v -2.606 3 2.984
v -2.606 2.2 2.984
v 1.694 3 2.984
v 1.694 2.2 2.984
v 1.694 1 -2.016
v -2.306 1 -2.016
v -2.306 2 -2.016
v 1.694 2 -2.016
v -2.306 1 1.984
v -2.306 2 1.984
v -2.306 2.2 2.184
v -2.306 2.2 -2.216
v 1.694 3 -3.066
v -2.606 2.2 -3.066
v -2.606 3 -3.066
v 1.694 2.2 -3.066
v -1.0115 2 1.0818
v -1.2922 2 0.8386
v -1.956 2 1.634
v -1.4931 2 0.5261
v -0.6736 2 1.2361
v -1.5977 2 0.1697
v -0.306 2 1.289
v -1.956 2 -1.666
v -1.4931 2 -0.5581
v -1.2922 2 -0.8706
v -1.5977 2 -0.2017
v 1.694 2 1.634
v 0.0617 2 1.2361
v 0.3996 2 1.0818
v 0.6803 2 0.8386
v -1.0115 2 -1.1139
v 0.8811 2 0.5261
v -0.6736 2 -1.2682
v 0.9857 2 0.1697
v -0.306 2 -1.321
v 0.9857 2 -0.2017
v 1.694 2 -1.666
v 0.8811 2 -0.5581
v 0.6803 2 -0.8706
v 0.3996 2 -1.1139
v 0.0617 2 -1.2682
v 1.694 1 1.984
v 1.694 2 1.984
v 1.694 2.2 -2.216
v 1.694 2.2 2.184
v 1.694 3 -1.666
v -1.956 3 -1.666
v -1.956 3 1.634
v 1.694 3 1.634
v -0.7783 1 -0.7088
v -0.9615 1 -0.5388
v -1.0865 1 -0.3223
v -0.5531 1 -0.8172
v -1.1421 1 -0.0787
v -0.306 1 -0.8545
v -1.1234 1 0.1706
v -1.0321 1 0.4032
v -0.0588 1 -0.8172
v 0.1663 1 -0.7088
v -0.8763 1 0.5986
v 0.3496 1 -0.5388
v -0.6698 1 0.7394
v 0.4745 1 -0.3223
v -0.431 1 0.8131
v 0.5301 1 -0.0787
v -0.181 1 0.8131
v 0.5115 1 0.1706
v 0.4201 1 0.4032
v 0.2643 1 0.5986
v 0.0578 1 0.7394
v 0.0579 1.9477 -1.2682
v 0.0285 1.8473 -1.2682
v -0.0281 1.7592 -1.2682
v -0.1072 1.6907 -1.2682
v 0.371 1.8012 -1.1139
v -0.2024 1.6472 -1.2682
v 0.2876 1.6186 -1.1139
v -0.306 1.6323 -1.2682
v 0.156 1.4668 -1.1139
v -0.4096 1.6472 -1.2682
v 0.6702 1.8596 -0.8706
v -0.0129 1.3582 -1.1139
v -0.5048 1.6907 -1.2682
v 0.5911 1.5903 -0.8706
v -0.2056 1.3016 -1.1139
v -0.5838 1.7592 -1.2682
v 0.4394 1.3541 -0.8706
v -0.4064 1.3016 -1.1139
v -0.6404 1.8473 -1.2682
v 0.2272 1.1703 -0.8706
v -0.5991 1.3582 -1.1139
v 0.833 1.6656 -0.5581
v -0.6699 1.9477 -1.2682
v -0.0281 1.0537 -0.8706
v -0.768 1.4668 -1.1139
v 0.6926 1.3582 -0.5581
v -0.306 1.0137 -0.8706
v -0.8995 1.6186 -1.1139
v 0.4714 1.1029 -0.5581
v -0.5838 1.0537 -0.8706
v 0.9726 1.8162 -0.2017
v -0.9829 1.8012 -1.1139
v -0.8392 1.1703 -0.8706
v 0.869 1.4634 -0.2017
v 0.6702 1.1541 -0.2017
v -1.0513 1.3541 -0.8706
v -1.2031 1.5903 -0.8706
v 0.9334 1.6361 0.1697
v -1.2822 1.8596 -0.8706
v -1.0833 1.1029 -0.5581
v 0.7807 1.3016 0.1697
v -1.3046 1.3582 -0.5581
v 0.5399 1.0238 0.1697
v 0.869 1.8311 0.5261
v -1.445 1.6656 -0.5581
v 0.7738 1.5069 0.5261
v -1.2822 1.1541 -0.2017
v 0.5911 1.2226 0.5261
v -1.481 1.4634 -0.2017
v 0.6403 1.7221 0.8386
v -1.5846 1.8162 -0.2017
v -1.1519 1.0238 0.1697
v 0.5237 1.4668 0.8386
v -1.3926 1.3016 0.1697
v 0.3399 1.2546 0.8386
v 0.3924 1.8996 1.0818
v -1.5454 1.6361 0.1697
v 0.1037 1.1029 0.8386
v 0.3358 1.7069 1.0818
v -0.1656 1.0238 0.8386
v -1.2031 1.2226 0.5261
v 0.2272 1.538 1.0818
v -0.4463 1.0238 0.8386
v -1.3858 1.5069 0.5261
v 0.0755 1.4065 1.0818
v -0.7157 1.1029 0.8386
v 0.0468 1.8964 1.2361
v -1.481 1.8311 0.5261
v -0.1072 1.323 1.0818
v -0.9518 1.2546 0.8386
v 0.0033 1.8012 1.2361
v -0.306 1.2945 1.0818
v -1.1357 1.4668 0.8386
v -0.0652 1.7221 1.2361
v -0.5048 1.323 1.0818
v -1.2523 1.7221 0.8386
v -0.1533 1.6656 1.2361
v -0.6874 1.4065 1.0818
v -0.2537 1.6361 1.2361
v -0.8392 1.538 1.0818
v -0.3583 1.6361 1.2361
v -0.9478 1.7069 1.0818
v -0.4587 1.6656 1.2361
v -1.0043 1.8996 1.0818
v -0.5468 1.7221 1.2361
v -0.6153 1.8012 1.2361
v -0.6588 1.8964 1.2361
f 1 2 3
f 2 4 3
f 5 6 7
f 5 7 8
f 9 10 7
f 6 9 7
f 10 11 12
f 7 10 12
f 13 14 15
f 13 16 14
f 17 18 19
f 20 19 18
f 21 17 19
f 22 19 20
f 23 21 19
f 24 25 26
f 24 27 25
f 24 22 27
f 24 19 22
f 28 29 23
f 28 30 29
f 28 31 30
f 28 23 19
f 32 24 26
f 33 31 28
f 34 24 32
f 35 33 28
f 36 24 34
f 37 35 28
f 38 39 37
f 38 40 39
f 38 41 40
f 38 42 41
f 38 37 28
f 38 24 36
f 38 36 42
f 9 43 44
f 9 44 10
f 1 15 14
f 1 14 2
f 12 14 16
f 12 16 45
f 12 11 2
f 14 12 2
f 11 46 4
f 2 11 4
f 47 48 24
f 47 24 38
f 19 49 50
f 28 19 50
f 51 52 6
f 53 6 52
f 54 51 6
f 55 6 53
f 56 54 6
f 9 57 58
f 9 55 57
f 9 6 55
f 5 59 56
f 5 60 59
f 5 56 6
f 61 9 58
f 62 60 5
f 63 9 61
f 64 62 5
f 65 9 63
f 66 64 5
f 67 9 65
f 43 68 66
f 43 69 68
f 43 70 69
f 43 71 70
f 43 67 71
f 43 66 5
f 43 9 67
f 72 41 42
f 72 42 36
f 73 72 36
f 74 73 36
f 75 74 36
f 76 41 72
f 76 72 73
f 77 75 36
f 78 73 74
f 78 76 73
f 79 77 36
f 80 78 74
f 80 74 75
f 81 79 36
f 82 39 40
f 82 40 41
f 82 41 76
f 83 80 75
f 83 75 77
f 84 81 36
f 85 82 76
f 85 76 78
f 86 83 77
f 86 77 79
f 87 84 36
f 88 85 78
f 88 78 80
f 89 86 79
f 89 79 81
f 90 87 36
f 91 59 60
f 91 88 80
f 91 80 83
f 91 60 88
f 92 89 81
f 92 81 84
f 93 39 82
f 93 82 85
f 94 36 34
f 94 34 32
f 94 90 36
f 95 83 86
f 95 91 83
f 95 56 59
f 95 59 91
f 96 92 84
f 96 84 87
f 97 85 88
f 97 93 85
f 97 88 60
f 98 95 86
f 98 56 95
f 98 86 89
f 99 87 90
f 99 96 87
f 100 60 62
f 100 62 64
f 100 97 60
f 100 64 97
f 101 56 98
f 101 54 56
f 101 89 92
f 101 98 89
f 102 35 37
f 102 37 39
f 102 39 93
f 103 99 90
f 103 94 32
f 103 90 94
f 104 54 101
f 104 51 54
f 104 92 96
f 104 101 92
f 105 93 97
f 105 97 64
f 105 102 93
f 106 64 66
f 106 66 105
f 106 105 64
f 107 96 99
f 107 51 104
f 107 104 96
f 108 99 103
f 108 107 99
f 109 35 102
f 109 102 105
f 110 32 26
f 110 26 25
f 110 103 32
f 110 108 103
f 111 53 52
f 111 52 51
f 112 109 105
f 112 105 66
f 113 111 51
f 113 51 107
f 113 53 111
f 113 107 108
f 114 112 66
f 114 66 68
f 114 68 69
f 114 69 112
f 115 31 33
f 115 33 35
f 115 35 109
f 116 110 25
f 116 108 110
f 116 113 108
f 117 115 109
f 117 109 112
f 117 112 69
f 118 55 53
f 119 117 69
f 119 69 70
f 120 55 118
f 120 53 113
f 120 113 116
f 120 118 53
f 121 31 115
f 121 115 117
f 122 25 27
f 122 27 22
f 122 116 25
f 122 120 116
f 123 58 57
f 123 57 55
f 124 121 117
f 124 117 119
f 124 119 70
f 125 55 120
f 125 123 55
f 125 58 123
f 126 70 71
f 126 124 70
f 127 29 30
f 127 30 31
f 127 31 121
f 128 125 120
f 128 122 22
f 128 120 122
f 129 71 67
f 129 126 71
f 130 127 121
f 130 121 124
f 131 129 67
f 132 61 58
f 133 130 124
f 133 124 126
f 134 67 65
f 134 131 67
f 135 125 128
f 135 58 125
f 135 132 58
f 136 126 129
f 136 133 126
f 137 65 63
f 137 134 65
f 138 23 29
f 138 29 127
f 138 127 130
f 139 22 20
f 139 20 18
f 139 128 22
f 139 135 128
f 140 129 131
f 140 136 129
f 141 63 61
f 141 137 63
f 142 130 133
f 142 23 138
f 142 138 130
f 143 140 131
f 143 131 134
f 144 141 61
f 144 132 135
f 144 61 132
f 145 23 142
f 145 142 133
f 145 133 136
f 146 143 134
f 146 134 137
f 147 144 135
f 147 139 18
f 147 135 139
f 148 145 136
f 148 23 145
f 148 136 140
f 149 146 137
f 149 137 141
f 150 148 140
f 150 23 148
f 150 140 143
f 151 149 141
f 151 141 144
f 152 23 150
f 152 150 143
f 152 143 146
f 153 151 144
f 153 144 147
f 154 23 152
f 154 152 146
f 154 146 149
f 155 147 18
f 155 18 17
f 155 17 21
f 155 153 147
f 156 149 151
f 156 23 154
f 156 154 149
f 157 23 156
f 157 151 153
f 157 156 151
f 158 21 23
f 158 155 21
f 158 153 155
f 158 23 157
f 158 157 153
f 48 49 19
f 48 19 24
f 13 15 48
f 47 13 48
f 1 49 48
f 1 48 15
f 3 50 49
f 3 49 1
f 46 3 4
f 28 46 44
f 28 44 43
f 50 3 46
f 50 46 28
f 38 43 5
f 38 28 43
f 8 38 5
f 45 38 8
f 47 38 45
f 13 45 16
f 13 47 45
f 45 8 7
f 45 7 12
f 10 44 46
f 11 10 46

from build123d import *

# Parameters (mm, degrees)
SKETCH1_W           = 4
SKETCH1_H           = 4
BOSS_EXTRUDE1_DEPTH = 2
SKETCH3_W           = 6.995739113
SKETCH3_H           = 4.795831112
CUT_EXTRUDE1_DEPTH  = 1
BOSS_EXTRUDE2_DEPTH = 1
SKETCH5_W           = 4
SKETCH5_H           = 0.8
BOSS_EXTRUDE3_DEPTH = 1
SKETCH6_W           = 4
SKETCH6_H           = 0.8
BOSS_EXTRUDE4_DEPTH = 1
SKETCH8_W           = 4
SKETCH8_H           = 0.05
CUT_EXTRUDE2_DEPTH  = 0.2
SKETCH9_W           = 6.05
SKETCH9_H           = 0.8
BOSS_EXTRUDE6_DEPTH = 0.3
SKETCH10_W          = 4.051772222
SKETCH10_H          = 3.3
CUT_EXTRUDE3_DEPTH  = 1
BOSS_EXTRUDE7_DEPTH = 4
BOSS_EXTRUDE8_DEPTH = 4


with BuildPart() as part:
    # Sketch1 → Boss-Extrude1 (new body)
    with BuildSketch(Plane(origin=(0, 0, 0), x_dir=(1, 0, 0), z_dir=(0, 1, 0))):
        with Locations((-0.305984445, 0.016020496)):
            Rectangle(SKETCH1_W, SKETCH1_H)
    extrude(amount=BOSS_EXTRUDE1_DEPTH)

    # Sketch2 → Cut-Revolve1 (revolve, cut)
    with BuildSketch(Plane(origin=(0, 2, 0), x_dir=(1, 0, 0), z_dir=(0, 1, 0))):
        with BuildLine():
            Line((-0.305984445, -1.288979504), (-0.305984445, 1.321020496))
            ThreePointArc((-0.305984445, 1.321020496), (-1.610984445, 0.016020496), (-0.305984445, -1.288979504))
        make_face()
    revolve(axis=Axis((-0.305984445, 2, 1.288979504), (0, 0, -1)), mode=Mode.SUBTRACT)

    # Sketch3 → Cut-Extrude1 (cut)
    with BuildSketch(Plane.XZ):
        with Locations((-1.219435612, 0.226207457)):
            Rectangle(SKETCH3_W, SKETCH3_H)
    extrude(amount=-CUT_EXTRUDE1_DEPTH, mode=Mode.SUBTRACT)

    # Sketch4 → Boss-Extrude2 (add)
    with BuildSketch(Plane(origin=(0, 2, 0), x_dir=(1, 0, 0), z_dir=(0, 1, 0))):
        Polygon((-1.905984445, -1.583979504), (1.515020657, -1.583979504), (1.694015555, -1.583979504), (1.694015555, -1.983979504), (-2.305984445, -1.983979504), (-2.305984445, 2.066020496), (1.694015555, 2.066020496), (1.694015555, 1.616020496), (1.515020657, 1.616020496), (-1.905984445, 1.616020496), align=None)
    extrude(amount=BOSS_EXTRUDE2_DEPTH)

    # Sketch5 → Boss-Extrude3 (add)
    with BuildSketch(Plane.XY.offset(1.983979504)):
        with Locations((-0.305984445, 2.6)):
            Rectangle(SKETCH5_W, SKETCH5_H)
    extrude(amount=BOSS_EXTRUDE3_DEPTH)

    # Sketch6 → Boss-Extrude4 (add)
    with BuildSketch(Plane(origin=(0, 0, -2.066020496), x_dir=(-1, 0, 0), z_dir=(0, 0, -1))):
        with Locations((0.305984445, 2.6)):
            Rectangle(SKETCH6_W, SKETCH6_H)
    extrude(amount=BOSS_EXTRUDE4_DEPTH)

    # Sketch8 → Cut-Extrude2 (cut)
    with BuildSketch(Plane.XZ.offset(-2)):
        with Locations((-0.305984445, -2.041020496)):
            Rectangle(SKETCH8_W, SKETCH8_H)
    extrude(amount=-CUT_EXTRUDE2_DEPTH, mode=Mode.SUBTRACT)

    # Sketch9 → Boss-Extrude6 (add)
    with BuildSketch(Plane.ZY.offset(2.305984445)):
        with Locations((-0.041020496, 2.6)):
            Rectangle(SKETCH9_W, SKETCH9_H)
    extrude(amount=BOSS_EXTRUDE6_DEPTH)

    # Sketch10 → Cut-Extrude3 (cut)
    with BuildSketch(Plane(origin=(0, 3, 0), x_dir=(1, 0, 0), z_dir=(0, 1, 0))):
        with Locations((0.069901666, 0.016020496)):
            Rectangle(SKETCH10_W, SKETCH10_H)
    extrude(amount=-CUT_EXTRUDE3_DEPTH, mode=Mode.SUBTRACT)

    # Sketch11 → Boss-Extrude7 (add)
    with BuildSketch(Plane(origin=(1.694015555, 0, 0), x_dir=(0, 0, -1), z_dir=(1, 0, 0))):
        Polygon((-1.983979504, 2), (-2.183979504, 2.2), (-1.983979504, 2.2), align=None)
    extrude(amount=-BOSS_EXTRUDE7_DEPTH)

    # Sketch12 → Boss-Extrude8 (add)
    with BuildSketch(Plane(origin=(1.694015555, 0, 0), x_dir=(0, 0, -1), z_dir=(1, 0, 0))):
        Polygon((2.016020496, 2.2), (2.016020496, 2), (2.216020496, 2.2), align=None)
    extrude(amount=-BOSS_EXTRUDE8_DEPTH)


solid = part.part
